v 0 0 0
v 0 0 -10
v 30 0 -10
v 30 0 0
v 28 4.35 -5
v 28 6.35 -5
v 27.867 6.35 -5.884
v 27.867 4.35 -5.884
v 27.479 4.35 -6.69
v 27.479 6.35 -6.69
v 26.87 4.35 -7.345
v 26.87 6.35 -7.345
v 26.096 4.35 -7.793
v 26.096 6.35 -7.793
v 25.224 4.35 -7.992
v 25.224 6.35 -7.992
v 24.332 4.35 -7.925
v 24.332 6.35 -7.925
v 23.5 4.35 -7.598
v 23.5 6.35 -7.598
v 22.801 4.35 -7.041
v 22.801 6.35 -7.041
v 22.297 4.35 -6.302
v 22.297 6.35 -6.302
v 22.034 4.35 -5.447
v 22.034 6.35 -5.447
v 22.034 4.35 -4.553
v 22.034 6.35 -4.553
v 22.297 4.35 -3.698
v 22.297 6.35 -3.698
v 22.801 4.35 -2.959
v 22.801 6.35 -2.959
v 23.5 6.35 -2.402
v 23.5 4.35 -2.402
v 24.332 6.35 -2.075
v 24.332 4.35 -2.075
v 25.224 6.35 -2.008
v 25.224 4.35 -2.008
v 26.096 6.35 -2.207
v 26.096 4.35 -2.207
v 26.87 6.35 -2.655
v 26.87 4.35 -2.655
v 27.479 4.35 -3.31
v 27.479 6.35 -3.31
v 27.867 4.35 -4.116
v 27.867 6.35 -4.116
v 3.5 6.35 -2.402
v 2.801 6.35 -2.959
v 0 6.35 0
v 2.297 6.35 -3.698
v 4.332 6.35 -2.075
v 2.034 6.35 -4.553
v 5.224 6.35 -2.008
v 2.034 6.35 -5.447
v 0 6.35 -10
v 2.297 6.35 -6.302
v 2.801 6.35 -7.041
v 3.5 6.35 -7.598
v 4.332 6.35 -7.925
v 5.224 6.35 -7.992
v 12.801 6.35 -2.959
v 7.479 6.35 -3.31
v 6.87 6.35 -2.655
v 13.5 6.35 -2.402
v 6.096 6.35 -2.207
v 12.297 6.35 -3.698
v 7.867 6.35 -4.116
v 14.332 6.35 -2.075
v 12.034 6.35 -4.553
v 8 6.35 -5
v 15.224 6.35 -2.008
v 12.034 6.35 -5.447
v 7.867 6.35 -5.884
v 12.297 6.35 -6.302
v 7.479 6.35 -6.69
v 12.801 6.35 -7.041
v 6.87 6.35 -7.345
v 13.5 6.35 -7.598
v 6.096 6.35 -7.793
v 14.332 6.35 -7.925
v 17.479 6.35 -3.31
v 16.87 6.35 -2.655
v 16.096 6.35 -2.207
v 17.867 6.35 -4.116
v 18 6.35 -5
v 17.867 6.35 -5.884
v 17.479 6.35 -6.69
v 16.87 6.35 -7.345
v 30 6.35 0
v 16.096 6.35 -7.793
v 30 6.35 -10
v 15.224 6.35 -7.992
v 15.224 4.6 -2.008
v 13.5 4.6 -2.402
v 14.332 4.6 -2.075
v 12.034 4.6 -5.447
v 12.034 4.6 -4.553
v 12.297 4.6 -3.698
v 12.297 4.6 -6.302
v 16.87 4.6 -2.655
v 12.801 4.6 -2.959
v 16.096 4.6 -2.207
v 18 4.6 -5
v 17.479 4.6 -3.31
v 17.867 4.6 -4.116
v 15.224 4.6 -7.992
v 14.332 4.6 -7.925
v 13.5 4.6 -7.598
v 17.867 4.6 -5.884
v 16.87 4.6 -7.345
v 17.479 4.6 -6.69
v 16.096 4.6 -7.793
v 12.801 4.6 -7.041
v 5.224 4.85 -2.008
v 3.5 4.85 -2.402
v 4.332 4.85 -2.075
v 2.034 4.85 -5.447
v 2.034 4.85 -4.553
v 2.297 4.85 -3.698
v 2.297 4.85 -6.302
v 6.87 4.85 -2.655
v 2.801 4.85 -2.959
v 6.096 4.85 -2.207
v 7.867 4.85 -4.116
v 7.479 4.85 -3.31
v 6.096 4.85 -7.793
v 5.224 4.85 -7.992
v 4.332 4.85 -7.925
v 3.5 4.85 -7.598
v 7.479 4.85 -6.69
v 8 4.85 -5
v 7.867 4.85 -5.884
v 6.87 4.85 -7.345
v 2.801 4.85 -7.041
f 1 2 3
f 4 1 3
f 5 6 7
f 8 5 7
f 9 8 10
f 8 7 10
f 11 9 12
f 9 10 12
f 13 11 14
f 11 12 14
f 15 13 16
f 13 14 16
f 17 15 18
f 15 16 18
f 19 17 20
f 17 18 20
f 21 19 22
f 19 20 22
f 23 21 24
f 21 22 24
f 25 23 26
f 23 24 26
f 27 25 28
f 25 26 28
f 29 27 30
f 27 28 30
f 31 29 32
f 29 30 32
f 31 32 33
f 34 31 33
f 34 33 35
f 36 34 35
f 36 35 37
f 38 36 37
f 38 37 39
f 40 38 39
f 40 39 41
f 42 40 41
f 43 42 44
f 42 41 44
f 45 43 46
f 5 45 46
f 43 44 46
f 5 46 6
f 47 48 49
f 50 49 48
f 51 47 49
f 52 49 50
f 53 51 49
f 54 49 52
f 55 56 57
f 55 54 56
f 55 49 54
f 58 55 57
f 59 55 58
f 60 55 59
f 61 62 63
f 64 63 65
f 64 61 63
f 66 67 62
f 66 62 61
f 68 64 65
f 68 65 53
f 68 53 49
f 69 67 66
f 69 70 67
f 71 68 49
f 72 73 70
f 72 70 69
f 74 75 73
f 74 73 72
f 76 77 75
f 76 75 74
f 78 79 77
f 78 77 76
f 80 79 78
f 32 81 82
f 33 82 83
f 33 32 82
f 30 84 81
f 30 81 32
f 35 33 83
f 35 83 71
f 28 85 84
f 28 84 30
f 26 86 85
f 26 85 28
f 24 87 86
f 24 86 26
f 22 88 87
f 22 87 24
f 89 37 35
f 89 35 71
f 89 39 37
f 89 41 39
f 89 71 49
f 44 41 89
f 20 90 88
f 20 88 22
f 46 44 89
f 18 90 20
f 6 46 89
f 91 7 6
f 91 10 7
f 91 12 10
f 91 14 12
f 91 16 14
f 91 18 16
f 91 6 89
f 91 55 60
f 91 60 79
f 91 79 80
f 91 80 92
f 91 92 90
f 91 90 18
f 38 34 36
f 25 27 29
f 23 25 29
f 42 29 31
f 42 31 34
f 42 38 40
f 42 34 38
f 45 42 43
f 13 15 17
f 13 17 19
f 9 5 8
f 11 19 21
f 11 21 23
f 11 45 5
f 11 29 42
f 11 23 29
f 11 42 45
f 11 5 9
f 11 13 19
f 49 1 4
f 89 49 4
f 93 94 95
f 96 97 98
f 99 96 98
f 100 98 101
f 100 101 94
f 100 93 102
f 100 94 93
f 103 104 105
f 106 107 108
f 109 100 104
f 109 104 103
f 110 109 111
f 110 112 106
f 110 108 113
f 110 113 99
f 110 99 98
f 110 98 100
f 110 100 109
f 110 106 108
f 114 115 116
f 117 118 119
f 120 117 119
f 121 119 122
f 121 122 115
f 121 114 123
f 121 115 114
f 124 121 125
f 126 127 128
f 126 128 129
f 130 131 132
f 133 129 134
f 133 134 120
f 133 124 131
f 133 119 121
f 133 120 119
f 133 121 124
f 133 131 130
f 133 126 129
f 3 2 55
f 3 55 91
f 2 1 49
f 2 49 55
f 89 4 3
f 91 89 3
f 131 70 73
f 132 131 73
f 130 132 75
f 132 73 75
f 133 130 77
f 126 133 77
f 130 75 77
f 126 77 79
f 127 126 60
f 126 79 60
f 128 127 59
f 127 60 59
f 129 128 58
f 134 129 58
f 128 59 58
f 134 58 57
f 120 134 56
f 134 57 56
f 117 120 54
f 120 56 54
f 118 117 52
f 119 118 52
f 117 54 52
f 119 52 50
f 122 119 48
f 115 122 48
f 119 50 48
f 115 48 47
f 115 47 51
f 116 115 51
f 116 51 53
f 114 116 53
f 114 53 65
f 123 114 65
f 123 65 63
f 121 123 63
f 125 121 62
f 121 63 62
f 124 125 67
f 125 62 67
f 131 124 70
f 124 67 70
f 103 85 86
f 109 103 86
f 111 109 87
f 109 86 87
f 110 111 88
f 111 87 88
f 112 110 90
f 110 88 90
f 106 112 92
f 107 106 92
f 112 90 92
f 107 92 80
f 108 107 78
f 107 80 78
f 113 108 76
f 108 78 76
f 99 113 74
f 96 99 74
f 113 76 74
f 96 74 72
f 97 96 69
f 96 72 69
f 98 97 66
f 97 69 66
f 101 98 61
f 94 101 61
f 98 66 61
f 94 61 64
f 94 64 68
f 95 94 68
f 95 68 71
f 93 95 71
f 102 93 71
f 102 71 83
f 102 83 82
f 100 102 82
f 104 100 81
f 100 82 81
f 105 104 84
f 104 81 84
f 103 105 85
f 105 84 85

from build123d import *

# Parameters (mm, degrees)
SKETCH1_W           = 30
SKETCH1_H           = 10
BOSS_EXTRUDE1_DEPTH = 6.35
SKETCH2_R           = 3
CUT_EXTRUDE1_DEPTH  = 1.75
SKETCH4_R           = 3
CUT_EXTRUDE2_DEPTH  = 1.5
SKETCH5_R           = 3
CUT_EXTRUDE3_DEPTH  = 2


with BuildPart() as part:
    # Sketch1 → Boss-Extrude1 (new body)
    with BuildSketch(Plane(origin=(0, 0, 0), x_dir=(1, 0, 0), z_dir=(0, 1, 0))):
        with Locations((15, 5)):
            Rectangle(SKETCH1_W, SKETCH1_H)
    extrude(amount=BOSS_EXTRUDE1_DEPTH)

    # Sketch2 → Cut-Extrude1 (cut)
    with BuildSketch(Plane(origin=(0, 6.35, 0), x_dir=(1, 0, 0), z_dir=(0, 1, 0))):
        with Locations((15, 5)):
            Circle(SKETCH2_R)
    extrude(amount=-CUT_EXTRUDE1_DEPTH, mode=Mode.SUBTRACT)

    # Sketch4 → Cut-Extrude2 (cut)
    with BuildSketch(Plane(origin=(0, 6.35, 0), x_dir=(1, 0, 0), z_dir=(0, 1, 0))):
        with Locations((5, 5)):
            Circle(SKETCH4_R)
    extrude(amount=-CUT_EXTRUDE2_DEPTH, mode=Mode.SUBTRACT)

    # Sketch5 → Cut-Extrude3 (cut)
    with BuildSketch(Plane(origin=(0, 6.35, 0), x_dir=(1, 0, 0), z_dir=(0, 1, 0))):
        with Locations((25, 5)):
            Circle(SKETCH5_R)
    extrude(amount=-CUT_EXTRUDE3_DEPTH, mode=Mode.SUBTRACT)


solid = part.part
